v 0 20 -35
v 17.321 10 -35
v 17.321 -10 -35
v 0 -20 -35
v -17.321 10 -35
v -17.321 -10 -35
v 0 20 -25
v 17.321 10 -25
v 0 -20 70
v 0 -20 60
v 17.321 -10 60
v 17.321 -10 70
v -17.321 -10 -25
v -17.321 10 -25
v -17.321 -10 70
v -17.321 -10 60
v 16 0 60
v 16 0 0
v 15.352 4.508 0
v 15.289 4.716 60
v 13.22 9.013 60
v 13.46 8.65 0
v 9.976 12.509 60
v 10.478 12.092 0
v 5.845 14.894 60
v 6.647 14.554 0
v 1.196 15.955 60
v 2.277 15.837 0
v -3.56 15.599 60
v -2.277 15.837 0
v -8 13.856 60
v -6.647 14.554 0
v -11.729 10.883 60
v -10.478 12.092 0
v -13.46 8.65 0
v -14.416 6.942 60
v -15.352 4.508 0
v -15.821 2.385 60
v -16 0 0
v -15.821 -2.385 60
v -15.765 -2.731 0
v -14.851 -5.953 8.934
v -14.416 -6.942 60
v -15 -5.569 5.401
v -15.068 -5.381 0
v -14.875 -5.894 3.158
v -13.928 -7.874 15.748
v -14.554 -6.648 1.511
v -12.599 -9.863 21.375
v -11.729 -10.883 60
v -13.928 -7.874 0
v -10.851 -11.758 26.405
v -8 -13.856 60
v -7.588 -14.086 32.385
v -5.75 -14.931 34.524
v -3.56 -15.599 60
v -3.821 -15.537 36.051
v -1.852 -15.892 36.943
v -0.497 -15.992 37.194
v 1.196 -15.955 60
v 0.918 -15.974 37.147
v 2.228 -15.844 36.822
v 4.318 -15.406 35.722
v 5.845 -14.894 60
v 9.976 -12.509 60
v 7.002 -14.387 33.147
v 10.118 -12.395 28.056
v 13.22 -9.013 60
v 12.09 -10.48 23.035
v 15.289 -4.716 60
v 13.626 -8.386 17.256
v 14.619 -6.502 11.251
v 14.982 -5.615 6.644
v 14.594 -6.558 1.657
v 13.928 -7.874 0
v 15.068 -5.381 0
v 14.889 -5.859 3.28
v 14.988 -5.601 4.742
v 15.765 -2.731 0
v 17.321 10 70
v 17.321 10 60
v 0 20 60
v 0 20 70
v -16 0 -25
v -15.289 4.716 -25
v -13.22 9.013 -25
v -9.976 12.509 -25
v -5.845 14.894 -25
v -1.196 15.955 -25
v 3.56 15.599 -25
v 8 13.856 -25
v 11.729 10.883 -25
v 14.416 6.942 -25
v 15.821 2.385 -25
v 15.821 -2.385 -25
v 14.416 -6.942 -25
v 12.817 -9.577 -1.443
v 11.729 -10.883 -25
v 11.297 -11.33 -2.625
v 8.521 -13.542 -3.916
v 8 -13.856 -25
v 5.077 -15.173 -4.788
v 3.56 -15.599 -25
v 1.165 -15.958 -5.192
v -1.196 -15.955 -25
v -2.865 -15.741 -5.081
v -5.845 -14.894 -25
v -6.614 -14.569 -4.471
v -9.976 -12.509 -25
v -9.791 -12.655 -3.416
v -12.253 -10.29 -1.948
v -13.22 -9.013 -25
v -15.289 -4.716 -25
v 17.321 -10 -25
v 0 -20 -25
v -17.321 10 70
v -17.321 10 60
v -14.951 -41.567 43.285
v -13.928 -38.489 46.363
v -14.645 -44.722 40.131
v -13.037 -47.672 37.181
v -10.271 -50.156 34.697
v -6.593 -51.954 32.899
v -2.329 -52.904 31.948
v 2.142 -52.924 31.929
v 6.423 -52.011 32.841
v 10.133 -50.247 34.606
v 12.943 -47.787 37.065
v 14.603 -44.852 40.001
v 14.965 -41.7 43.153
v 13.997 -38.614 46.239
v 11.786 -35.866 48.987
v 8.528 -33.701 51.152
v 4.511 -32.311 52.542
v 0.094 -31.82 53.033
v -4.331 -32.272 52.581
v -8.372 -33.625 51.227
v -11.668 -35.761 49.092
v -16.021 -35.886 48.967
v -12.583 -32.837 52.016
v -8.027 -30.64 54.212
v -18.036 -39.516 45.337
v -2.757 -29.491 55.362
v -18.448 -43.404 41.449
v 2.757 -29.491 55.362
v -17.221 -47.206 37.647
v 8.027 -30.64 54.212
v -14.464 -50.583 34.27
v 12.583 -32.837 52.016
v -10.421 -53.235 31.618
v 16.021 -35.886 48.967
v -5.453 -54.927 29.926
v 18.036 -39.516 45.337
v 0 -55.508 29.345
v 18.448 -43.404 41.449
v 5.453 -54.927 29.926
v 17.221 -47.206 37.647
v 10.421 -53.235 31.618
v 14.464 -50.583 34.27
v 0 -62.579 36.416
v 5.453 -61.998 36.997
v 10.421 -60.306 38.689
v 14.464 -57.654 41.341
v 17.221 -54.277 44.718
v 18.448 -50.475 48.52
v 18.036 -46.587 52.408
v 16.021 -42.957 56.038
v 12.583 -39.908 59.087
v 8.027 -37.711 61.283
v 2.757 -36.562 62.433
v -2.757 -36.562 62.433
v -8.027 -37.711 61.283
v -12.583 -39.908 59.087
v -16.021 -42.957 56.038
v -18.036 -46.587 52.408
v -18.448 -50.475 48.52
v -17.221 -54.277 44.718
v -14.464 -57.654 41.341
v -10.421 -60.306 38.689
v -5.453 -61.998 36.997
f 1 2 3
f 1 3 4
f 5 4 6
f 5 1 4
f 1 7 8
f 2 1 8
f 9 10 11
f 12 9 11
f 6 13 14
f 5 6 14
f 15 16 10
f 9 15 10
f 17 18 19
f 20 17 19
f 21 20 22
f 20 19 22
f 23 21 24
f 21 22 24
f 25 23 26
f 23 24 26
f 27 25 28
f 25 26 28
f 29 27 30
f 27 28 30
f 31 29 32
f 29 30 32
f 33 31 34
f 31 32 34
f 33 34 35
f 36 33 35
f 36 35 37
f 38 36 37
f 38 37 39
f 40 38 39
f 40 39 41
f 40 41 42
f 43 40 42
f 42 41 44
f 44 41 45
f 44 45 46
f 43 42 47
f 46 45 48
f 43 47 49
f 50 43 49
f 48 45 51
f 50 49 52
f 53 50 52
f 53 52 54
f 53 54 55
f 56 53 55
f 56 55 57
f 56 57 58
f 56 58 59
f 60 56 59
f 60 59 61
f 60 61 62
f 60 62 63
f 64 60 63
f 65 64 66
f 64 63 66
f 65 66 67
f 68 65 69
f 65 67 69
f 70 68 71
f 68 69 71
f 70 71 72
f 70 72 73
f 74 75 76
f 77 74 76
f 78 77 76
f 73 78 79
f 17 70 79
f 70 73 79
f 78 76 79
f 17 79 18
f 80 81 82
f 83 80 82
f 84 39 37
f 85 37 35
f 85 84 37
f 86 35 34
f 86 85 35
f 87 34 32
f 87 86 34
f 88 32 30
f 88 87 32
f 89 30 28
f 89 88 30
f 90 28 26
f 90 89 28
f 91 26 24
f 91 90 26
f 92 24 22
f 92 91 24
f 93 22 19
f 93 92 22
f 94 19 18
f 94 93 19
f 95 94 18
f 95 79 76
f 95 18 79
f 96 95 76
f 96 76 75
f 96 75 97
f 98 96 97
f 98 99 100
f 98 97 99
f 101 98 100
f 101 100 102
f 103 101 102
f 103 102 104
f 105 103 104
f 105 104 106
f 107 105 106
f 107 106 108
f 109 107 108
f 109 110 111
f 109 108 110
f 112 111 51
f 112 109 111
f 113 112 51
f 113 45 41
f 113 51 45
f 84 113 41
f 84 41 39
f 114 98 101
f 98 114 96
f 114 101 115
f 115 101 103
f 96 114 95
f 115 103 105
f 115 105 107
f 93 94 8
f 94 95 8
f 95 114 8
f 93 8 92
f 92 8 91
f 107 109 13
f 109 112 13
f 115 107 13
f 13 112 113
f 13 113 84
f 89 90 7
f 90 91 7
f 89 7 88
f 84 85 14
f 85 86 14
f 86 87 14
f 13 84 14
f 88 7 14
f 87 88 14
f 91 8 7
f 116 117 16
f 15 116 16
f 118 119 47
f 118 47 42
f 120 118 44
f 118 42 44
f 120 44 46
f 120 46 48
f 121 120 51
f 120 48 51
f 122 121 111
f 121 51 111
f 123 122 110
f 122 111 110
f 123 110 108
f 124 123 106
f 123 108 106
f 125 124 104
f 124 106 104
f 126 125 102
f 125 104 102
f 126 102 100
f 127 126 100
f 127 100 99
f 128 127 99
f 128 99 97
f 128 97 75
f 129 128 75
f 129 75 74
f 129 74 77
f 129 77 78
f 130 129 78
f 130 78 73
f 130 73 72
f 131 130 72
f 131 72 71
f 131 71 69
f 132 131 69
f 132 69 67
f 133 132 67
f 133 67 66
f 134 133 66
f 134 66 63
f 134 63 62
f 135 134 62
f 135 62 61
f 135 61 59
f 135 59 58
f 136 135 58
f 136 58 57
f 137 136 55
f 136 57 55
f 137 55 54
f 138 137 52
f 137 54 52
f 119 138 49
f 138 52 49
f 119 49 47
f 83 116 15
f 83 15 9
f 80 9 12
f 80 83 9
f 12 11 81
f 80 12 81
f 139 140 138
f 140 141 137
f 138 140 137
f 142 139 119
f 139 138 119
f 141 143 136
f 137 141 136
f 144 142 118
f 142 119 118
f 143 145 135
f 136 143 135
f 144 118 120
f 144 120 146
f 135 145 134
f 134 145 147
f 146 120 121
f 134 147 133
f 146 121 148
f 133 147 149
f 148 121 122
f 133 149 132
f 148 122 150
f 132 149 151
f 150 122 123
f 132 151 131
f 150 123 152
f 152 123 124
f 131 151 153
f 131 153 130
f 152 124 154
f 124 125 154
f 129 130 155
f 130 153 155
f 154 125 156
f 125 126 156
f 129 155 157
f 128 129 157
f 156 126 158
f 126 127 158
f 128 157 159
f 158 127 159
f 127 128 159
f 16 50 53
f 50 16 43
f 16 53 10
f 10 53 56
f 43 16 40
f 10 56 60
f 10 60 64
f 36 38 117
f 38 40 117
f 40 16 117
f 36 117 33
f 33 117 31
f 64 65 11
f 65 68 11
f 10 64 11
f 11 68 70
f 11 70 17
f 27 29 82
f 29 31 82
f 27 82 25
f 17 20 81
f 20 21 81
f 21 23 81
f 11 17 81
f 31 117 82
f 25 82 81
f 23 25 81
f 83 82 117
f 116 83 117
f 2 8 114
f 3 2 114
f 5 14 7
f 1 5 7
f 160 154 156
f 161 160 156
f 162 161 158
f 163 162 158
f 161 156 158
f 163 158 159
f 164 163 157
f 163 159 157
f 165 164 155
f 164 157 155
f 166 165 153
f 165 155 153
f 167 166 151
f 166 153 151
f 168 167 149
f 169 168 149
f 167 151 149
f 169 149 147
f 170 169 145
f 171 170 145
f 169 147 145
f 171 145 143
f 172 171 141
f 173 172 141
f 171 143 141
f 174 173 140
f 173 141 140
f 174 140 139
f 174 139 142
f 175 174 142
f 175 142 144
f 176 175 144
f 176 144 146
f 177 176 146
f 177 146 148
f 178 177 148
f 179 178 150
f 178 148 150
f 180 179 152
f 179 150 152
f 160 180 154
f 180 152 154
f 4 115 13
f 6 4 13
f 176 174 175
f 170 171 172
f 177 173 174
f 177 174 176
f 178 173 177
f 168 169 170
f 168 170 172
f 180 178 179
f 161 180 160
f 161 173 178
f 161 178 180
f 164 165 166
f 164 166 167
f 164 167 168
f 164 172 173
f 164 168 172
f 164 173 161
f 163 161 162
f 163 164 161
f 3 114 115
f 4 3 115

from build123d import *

# Parameters (mm, degrees)
SKETCH_3_R        = 16
EXTRUDE_417_DEPTH = 60
SKETCH_4_R        = 15
EXTRUDE_1_DEPTH   = 60
SKETCH_9_R        = 18.5
EXTRUDE_2_DEPTH   = 10
EXTRUDE_5_DEPTH   = 10
EXTRUDE_START     = 25
SKETCH_13_R       = 16
EXTRUDE_6_DEPTH   = 25
EXTRUDE_7_DEPTH   = 10


with BuildPart() as part:
    # Эскиз3 → Extrude 417 (new body)
    with BuildSketch(Plane.XY):
        Circle(SKETCH_3_R)
    extrude(amount=EXTRUDE_417_DEPTH)

    # Эскиз4 → Бобышка-Вытянуть1 (add)
    with BuildSketch(Plane(origin=(0, 0, 0), x_dir=(1, 0, 0), z_dir=(0, -0.707106781186544, 0.7071067811865511))):
        with Locations(Location((0, 0, 0), (0, 0, 158.211329465))):
            Circle(SKETCH_4_R)
    extrude(amount=EXTRUDE_1_DEPTH)

    # Эскиз9 → Бобышка-Вытянуть2 (add)
    with BuildSketch(Plane(origin=(0, -42.426406871, 42.426406871), x_dir=(1, 0, 0), z_dir=(0, -0.7071067811865441, 0.7071067811865509))):
        with Locations(Location((0, 0, 0), (0, 0, 270))):
            Circle(SKETCH_9_R)
    extrude(amount=EXTRUDE_2_DEPTH)

    # Эскиз12 → Бобышка-Вытянуть5 (add)
    with BuildSketch(Plane.XY.offset(60)):
        Polygon((0, 20), (-17.320508076, 10), (-17.320508076, -10), (0, -20), (17.320508076, -10), (17.320508076, 10), align=None)
    extrude(amount=EXTRUDE_5_DEPTH)

    # Эскиз13 → Бобышка-Вытянуть6 (add)
    with BuildSketch(Plane(origin=(0, 0, 0), x_dir=(-1, 0, 0), z_dir=(0, 0, -1)).offset(EXTRUDE_START)):
        Circle(SKETCH_13_R)
    extrude(amount=-EXTRUDE_6_DEPTH)

    # Эскиз14 → Бобышка-Вытянуть7 (add)
    with BuildSketch(Plane(origin=(0, 0, -25), x_dir=(-1, 0, 0), z_dir=(0, 0, -1))):
        Polygon((0, -20), (17.320508076, -10), (17.320508076, 10), (0, 20), (-17.320508076, 10), (-17.320508076, -10), align=None)
    extrude(amount=EXTRUDE_7_DEPTH)


solid = part.part
